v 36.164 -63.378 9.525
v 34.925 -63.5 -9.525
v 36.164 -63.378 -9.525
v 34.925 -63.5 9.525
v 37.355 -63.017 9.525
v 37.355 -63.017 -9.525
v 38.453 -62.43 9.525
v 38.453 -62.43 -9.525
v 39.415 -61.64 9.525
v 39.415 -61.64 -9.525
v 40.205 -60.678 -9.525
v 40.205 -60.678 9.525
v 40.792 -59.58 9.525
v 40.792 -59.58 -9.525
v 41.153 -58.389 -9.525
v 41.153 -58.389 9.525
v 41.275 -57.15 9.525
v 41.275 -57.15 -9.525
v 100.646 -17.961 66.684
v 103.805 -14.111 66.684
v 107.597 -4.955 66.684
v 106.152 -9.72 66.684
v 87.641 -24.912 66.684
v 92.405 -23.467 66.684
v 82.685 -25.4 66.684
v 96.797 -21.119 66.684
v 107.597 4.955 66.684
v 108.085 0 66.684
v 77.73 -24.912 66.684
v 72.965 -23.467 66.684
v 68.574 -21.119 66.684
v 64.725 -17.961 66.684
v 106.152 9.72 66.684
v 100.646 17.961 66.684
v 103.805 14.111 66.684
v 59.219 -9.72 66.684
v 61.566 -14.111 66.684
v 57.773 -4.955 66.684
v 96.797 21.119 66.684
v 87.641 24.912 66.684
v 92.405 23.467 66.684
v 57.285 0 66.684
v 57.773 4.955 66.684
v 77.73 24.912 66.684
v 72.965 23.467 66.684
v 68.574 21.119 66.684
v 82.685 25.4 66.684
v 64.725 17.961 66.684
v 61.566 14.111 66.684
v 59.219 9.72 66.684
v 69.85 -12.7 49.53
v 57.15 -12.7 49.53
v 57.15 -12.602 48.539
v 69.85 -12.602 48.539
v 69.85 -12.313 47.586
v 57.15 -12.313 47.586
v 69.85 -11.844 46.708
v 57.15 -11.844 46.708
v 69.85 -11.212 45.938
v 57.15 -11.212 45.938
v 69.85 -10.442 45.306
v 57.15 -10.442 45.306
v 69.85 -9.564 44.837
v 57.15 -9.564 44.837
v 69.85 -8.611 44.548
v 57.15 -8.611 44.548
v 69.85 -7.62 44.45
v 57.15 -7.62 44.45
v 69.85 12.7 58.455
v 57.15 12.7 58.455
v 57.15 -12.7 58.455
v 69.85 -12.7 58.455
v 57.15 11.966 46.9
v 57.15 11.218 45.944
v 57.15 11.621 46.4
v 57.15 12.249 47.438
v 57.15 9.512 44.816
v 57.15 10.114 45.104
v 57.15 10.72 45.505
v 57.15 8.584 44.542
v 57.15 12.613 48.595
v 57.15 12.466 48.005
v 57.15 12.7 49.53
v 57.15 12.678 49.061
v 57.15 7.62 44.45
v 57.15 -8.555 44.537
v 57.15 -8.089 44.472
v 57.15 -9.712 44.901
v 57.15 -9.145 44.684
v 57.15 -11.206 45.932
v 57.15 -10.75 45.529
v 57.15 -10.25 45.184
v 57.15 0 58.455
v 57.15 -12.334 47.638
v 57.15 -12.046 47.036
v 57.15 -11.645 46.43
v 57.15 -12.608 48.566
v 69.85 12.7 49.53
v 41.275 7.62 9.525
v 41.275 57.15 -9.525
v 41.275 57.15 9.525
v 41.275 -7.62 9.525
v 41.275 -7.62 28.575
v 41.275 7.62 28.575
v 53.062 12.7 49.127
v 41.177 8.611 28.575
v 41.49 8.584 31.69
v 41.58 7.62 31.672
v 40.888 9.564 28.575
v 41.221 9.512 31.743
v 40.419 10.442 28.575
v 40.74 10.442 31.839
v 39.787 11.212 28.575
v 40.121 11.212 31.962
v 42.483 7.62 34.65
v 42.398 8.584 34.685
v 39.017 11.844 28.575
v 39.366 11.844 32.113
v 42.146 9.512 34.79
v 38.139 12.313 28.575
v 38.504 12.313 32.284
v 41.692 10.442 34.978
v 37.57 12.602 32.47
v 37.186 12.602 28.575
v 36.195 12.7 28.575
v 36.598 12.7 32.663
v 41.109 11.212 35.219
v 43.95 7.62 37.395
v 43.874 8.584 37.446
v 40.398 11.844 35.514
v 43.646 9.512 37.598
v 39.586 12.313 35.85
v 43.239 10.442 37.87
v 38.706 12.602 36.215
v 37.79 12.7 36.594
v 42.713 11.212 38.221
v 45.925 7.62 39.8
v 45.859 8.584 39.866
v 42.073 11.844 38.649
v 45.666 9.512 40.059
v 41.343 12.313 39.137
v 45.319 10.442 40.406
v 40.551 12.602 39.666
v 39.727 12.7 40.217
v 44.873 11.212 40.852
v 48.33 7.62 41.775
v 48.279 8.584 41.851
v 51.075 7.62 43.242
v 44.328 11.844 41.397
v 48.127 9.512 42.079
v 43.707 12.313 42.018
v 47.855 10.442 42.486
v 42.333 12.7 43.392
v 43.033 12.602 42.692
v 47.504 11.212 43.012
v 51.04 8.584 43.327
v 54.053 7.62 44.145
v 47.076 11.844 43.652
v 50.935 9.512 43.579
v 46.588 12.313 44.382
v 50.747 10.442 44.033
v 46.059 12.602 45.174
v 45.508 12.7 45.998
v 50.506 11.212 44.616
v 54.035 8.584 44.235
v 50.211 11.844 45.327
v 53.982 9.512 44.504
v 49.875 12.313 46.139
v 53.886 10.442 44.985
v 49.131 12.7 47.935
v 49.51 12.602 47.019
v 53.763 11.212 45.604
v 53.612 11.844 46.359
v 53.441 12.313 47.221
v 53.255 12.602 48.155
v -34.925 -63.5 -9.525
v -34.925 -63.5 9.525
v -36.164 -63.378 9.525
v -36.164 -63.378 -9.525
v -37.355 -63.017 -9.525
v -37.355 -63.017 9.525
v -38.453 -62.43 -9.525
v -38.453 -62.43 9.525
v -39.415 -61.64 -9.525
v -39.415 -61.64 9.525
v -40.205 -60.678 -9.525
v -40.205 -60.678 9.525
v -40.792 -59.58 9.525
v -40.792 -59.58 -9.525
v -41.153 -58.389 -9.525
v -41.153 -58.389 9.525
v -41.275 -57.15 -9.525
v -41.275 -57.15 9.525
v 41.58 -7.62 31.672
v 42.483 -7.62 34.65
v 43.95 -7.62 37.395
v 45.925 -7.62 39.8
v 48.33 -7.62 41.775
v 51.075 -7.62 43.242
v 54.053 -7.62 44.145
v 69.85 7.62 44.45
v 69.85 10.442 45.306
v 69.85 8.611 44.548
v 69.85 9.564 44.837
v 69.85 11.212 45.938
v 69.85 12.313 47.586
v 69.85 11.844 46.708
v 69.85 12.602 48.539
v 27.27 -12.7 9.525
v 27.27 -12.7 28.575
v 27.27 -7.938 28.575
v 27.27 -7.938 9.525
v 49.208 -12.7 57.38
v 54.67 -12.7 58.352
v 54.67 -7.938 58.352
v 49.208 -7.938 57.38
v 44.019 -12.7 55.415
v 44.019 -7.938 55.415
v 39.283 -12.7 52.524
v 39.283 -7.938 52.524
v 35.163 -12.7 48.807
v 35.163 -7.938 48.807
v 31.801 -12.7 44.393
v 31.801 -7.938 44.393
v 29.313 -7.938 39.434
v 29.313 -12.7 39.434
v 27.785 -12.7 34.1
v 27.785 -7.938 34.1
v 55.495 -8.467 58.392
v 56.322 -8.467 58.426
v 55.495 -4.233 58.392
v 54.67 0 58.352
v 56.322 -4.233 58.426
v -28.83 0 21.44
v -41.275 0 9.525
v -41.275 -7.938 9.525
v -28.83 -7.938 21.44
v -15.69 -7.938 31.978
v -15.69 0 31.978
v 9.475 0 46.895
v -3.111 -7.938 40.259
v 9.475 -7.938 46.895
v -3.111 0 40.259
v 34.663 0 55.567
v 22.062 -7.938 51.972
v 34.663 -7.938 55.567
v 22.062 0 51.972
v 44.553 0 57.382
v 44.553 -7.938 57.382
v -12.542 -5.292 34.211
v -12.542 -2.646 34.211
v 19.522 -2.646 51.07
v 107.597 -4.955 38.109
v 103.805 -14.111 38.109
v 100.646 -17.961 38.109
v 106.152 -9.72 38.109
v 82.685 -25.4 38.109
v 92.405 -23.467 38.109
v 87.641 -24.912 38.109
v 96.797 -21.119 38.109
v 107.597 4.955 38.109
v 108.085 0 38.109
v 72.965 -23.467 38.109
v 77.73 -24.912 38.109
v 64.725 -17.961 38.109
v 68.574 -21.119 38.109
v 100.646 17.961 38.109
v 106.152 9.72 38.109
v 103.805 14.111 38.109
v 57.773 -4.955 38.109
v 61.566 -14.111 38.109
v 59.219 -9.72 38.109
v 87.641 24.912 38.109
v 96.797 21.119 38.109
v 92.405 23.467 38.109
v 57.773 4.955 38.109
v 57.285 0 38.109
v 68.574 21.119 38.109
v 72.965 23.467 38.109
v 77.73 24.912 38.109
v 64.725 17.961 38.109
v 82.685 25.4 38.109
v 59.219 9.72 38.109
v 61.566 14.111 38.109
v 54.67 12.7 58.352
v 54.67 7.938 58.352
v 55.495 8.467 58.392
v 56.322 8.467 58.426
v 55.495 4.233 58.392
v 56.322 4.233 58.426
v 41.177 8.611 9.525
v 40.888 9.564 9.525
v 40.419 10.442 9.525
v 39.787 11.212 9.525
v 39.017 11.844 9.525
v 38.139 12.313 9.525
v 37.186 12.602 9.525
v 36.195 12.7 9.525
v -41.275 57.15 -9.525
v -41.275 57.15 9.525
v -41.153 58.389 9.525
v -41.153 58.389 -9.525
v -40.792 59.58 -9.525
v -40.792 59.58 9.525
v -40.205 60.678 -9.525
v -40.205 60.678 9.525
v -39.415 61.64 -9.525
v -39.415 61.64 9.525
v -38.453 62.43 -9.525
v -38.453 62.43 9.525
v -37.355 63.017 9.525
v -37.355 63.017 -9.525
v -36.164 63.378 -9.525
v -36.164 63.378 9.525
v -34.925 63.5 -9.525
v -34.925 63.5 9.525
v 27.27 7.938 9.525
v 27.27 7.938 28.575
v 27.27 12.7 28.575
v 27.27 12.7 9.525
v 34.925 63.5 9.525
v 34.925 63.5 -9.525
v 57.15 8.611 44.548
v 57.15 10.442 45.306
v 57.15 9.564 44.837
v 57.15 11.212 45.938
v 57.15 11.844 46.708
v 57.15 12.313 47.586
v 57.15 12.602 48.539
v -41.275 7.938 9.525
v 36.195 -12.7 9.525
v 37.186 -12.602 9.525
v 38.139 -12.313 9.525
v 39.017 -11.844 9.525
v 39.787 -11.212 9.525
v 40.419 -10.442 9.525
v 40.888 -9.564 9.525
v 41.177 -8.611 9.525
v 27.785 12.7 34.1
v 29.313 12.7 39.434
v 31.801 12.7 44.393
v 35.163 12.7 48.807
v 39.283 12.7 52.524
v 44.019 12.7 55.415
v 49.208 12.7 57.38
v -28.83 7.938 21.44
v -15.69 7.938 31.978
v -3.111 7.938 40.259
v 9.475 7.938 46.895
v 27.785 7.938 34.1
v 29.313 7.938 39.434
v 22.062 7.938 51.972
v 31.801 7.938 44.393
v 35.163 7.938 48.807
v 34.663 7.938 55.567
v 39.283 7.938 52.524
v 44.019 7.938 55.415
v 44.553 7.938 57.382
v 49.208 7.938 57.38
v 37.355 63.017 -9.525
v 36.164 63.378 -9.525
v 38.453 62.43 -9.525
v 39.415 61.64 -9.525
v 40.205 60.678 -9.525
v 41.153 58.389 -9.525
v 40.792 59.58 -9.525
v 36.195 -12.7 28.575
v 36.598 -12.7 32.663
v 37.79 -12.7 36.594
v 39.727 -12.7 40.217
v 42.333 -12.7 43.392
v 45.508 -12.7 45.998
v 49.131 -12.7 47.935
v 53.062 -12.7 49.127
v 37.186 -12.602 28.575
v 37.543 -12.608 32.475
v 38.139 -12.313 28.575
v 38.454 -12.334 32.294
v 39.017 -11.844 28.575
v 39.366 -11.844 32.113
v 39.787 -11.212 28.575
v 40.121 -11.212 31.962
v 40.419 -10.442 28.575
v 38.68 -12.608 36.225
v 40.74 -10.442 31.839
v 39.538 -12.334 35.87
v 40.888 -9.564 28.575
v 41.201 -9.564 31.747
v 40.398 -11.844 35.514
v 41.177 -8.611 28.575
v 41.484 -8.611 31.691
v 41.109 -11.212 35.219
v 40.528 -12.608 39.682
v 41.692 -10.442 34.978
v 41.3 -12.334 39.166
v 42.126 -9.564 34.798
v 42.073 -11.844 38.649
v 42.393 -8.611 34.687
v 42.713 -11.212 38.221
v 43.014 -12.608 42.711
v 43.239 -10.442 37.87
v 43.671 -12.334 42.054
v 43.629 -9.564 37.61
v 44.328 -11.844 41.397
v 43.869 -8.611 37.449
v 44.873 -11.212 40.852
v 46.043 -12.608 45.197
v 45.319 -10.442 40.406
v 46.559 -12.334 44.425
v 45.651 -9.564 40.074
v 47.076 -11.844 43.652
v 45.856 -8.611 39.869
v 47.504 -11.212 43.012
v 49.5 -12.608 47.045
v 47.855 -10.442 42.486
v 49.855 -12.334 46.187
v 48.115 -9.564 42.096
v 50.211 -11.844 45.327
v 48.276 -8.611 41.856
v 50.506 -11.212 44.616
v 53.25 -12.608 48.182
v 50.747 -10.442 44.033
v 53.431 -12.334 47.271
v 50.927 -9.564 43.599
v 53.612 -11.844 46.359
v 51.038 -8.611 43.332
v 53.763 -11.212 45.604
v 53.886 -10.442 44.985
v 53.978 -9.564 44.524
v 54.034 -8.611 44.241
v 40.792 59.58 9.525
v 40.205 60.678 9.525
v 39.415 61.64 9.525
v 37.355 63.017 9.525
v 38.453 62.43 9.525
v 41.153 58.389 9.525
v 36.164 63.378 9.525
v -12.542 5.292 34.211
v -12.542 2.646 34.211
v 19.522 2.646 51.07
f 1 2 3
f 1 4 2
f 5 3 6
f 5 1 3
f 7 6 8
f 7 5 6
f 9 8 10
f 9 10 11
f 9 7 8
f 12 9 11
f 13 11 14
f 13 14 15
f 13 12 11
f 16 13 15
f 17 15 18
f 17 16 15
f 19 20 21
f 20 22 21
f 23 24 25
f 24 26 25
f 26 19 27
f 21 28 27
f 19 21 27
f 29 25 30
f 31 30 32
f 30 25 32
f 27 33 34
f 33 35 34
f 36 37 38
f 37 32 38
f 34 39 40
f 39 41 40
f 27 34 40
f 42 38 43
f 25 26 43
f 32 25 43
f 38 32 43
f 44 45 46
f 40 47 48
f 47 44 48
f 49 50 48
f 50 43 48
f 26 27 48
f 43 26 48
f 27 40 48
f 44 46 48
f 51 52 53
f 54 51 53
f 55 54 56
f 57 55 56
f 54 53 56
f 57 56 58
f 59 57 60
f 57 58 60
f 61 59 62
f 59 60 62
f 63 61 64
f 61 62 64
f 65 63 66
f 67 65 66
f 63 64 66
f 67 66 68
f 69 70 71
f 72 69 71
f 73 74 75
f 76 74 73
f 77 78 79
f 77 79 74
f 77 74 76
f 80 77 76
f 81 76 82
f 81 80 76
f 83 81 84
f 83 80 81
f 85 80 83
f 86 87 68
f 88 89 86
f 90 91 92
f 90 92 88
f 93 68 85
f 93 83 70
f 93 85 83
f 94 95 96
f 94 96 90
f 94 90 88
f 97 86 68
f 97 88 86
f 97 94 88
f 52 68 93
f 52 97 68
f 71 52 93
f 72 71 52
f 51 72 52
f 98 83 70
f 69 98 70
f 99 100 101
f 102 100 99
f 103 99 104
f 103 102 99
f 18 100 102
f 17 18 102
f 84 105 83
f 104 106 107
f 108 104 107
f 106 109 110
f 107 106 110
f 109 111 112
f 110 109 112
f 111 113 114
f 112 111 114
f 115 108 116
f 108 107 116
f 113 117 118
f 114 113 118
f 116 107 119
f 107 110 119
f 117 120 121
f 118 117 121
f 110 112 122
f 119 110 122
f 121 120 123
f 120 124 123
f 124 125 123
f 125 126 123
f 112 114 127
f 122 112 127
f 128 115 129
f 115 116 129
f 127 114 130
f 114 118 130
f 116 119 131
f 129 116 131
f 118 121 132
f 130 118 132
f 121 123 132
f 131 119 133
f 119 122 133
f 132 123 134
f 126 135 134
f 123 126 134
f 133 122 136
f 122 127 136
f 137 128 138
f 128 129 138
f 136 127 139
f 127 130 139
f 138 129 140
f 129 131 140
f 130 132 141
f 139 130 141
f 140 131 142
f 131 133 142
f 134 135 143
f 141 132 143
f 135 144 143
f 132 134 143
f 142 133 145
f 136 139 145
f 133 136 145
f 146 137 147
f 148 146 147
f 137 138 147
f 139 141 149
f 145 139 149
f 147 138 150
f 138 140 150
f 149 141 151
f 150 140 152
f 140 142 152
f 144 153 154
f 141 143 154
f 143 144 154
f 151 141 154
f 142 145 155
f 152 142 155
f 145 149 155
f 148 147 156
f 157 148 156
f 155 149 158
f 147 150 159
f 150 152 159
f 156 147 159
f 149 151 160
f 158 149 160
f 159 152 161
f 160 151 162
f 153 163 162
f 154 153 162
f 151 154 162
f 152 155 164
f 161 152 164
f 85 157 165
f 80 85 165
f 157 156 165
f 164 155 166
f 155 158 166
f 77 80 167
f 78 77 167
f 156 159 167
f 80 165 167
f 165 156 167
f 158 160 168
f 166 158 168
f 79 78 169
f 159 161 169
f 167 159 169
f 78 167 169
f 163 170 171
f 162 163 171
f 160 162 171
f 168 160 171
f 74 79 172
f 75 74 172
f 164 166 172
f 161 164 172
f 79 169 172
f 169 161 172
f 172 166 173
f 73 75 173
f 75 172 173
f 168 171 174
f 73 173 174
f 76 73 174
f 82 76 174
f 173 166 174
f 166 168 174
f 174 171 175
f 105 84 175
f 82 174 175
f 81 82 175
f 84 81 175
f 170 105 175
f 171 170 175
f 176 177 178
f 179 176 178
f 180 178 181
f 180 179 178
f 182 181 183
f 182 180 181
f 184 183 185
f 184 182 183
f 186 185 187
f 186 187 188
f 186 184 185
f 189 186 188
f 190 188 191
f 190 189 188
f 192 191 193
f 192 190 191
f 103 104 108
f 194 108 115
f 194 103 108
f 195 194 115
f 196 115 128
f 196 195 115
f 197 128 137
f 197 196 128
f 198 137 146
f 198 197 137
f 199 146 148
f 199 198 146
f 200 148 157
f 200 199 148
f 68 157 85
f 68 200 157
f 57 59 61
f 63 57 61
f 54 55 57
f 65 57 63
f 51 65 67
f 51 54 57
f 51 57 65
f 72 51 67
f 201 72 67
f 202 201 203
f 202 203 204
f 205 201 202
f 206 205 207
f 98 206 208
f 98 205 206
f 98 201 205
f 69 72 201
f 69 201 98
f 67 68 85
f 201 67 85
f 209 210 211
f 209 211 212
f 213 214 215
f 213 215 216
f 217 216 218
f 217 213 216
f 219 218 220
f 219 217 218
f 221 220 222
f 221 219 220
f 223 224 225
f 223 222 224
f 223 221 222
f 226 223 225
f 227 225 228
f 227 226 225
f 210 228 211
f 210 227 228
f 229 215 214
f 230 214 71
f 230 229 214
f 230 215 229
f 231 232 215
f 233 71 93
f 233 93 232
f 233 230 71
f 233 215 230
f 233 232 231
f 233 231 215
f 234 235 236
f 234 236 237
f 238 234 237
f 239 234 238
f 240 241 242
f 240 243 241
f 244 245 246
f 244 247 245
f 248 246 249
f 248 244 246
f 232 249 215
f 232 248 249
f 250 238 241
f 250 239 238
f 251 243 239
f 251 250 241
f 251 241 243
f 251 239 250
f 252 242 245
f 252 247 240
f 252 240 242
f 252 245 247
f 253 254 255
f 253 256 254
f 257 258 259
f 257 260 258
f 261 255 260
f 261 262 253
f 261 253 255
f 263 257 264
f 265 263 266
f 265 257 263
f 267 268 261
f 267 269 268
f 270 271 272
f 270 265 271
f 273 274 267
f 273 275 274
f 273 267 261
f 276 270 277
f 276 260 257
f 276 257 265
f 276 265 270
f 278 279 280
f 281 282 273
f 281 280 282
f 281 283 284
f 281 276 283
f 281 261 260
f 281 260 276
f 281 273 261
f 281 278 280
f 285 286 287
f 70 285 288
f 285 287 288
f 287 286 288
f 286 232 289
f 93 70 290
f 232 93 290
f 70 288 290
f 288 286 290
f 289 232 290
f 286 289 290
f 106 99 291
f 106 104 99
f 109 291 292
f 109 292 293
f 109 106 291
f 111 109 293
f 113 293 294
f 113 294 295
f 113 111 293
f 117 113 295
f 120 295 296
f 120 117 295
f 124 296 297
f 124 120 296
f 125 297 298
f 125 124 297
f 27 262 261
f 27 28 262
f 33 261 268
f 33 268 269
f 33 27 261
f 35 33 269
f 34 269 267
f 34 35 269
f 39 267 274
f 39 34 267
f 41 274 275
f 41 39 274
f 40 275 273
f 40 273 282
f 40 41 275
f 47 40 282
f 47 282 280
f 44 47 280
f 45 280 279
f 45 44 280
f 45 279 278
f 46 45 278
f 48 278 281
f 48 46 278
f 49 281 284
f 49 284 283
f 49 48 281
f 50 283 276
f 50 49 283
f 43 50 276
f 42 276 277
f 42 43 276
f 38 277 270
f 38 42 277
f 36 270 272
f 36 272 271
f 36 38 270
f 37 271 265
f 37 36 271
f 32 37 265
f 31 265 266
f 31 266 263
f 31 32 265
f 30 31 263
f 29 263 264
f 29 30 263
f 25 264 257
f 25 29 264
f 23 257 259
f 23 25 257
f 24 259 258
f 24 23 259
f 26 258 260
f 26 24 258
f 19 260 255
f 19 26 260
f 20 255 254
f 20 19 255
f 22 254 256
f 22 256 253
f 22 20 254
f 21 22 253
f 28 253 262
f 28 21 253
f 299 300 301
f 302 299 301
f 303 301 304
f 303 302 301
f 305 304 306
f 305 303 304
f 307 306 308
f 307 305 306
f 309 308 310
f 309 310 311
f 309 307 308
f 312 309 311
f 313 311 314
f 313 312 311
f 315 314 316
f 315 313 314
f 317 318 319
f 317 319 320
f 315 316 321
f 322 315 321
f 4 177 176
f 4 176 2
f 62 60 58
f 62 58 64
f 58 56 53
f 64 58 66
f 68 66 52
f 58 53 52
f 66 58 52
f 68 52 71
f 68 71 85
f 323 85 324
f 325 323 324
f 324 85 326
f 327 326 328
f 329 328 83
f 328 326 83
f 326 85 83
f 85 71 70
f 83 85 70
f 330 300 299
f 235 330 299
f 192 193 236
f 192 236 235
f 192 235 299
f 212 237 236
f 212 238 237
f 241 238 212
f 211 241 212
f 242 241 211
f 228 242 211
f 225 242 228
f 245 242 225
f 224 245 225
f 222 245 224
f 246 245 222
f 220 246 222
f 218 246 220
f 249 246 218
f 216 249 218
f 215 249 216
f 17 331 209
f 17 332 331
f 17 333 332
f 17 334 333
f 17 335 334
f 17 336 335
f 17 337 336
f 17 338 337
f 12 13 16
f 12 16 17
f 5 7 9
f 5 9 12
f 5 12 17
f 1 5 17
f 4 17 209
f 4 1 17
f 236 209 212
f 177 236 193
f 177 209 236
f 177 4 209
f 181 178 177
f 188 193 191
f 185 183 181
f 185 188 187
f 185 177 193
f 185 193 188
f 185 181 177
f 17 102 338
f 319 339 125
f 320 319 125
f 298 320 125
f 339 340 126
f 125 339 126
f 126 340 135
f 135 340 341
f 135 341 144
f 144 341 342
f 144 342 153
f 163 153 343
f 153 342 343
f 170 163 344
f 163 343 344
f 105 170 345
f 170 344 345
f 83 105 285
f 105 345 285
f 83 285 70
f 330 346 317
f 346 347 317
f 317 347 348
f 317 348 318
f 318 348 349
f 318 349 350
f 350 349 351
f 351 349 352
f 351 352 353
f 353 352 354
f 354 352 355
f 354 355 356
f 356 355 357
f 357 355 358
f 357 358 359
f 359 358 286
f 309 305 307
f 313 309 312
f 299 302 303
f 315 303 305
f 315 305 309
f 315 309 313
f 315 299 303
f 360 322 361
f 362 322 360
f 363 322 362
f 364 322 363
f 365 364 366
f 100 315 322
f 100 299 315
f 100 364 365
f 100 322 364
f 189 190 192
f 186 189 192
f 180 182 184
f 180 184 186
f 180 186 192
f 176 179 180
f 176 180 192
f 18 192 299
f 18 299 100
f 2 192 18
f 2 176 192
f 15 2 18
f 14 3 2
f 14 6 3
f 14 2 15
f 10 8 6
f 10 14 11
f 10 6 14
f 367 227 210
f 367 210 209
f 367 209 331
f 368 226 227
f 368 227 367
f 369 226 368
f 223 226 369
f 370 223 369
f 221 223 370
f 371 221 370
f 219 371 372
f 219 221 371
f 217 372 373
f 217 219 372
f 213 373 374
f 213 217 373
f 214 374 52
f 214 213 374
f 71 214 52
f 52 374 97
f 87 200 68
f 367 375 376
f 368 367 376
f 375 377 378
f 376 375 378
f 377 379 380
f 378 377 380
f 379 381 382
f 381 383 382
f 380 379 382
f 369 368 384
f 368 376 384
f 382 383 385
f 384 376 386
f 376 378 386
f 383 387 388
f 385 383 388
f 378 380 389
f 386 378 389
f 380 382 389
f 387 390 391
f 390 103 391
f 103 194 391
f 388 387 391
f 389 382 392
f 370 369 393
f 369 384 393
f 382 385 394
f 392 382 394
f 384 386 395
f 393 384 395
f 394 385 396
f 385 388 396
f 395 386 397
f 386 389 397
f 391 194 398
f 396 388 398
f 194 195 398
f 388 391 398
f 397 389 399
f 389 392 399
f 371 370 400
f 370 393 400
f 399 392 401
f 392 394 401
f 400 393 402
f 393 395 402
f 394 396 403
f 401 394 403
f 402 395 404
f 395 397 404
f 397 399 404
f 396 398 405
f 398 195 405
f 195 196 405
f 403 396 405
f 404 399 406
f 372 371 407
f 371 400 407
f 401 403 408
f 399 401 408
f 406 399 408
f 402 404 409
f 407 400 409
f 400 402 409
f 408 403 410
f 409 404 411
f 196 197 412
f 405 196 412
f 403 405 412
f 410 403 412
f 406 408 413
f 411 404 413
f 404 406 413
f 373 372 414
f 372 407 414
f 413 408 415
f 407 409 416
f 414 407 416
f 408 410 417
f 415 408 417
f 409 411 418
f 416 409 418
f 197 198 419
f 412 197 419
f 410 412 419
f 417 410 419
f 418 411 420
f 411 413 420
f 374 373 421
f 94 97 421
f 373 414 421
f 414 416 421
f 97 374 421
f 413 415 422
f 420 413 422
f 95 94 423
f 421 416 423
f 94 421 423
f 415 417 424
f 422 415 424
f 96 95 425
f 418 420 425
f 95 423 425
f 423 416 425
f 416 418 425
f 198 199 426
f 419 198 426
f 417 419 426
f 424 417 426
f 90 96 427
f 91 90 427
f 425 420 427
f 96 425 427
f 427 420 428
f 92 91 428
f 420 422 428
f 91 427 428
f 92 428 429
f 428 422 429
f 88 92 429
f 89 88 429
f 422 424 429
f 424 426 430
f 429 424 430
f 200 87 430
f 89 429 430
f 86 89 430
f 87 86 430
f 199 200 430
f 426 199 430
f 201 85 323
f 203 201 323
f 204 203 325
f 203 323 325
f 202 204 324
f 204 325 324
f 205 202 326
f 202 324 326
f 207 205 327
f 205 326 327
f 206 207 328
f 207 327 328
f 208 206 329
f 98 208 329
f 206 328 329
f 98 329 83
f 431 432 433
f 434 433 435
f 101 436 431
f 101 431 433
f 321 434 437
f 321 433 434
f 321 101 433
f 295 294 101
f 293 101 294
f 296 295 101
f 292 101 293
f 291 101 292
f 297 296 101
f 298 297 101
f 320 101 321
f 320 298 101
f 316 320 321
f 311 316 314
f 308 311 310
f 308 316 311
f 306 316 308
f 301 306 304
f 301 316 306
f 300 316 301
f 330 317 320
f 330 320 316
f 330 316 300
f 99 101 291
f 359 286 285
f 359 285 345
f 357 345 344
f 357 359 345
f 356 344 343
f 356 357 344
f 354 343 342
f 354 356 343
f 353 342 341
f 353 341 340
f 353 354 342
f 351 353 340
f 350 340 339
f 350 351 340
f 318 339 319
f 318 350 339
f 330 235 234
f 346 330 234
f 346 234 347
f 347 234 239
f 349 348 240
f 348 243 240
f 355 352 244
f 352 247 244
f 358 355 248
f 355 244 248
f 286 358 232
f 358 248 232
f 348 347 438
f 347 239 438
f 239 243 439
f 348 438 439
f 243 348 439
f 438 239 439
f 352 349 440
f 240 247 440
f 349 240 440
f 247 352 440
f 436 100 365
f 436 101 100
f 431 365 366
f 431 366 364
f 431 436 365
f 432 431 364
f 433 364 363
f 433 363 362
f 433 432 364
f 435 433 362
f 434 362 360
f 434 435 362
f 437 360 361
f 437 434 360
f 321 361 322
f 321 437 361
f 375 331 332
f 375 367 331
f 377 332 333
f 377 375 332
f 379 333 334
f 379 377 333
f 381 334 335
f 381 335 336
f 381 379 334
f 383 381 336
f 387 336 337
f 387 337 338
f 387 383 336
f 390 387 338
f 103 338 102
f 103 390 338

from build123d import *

# Parameters (mm, degrees)
F1_DEPTH  = 63.5
F2_DEPTH  = 12.7
F3_DEPTH  = 7.9375
F5_R      = 6.35
F6_W      = 25.4
F6_H      = 28.575
F8_R      = 6.35
F9_R      = 6.35
F10_R     = 5.08
F11_DEPTH = 12.7


with BuildPart() as f1:
    # F0 (on Front) → F1 (new body, symmetric)
    with BuildSketch(Plane.XZ):
        Polygon((41.275, -9.525), (41.275, 9.525), (27.270238, 9.525), (-41.275, 9.525), (-41.275, -9.525), align=None)
    extrude(amount=F1_DEPTH, both=True)

    # F0 (on Front) → F2 (join, symmetric)
    with BuildSketch(Plane.XZ):
        with BuildLine():
            Line((27.270238, 9.525), (41.275, 9.525))
            Line((41.275, 9.525), (41.275, 28.575))
            ThreePointArc((41.275, 28.575), (45.92468, 39.80032), (57.15, 44.45))
            Line((57.15, 44.45), (57.15, 58.454762))
            add(Edge.make_bspline(
                [(54.670299, 58.35169), (55.494711, 58.394695), (56.321283, 58.429082), (57.15, 58.454762)],
                knots=[107.495526, 107.495526, 107.495526, 107.495526, 109.916342, 109.916342, 109.916342, 109.916342], degree=3))
            ThreePointArc((54.670299, 58.35169), (35.162583, 48.80749), (27.270238, 28.575))
            Line((27.270238, 28.575), (27.270238, 9.525))
        make_face()
    extrude(amount=F2_DEPTH, both=True)

    # F0 (on Front) → F3 (join, symmetric)
    with BuildSketch(Plane.XZ):
        with BuildLine():
            Line((-41.275, 9.525), (27.270238, 9.525))
            Line((27.270238, 9.525), (27.270238, 28.575))
            ThreePointArc((27.270238, 28.575), (35.162583, 48.80749), (54.670299, 58.35169))
            add(Edge.make_bspline(
                [(-41.275, 9.525), (-14.289114, 37.540552), (18.062517, 56.442069), (54.670299, 58.35169)],
                knots=[0, 0, 0, 0, 107.495526, 107.495526, 107.495526, 107.495526], degree=3))
        make_face()
    extrude(amount=F3_DEPTH, both=True)

    # F5
    f5_edges = [f1.edges().sort_by_distance(p)[0] for p in [
        (41.275, -63.5, 0),
    ]]
    fillet(f5_edges, radius=F5_R)

    # F8
    f8_edges = [f1.edges().sort_by_distance(p)[0] for p in [
        (-41.275, -63.5, 0),
    ]]
    fillet(f8_edges, radius=F8_R)

    # F9
    f9_edges = [f1.edges().sort_by_distance(p)[0] for p in [
        (41.275, 63.5, 0),
        (-41.275, 63.5, 0),
    ]]
    fillet(f9_edges, radius=F9_R)

    # F10
    f10_edges = [f1.edges().sort_by_distance(p)[0] for p in [
        (45.92468, -12.7, 39.80032),
        (41.275, 12.7, 19.05),
    ]]
    fillet(f10_edges, radius=F10_R)


with BuildPart() as f7:
    # F6 (on Front) → F7 (revolve)
    with BuildSketch(Plane.XZ):
        with Locations((95.385324, 52.396486)):
            Rectangle(F6_W, F6_H)
    revolve(axis=Axis((82.685324, 0, 52.396486), (0, 0, 1)))


with BuildPart() as f11:
    # F2_face (on face) → F11 (new body)
    with BuildSketch(Plane(origin=(57.15, 0, 51.640956), x_dir=(0, 1, 0), z_dir=(1, 0, 0))):
        with BuildLine():
            Line((-7.62, -7.190956), (7.62, -7.190956))
            ThreePointArc((7.62, -7.190956), (11.212102, -5.703059), (12.7, -2.110956))
            Line((12.7, -2.110956), (12.7, 6.813806))
            Line((12.7, 6.813806), (0, 6.813806))
            Line((0, 6.813806), (-12.7, 6.813806))
            Line((-12.7, 6.813806), (-12.7, -2.110956))
            ThreePointArc((-12.7, -2.110956), (-11.212102, -5.703059), (-7.62, -7.190956))
        make_face()
    extrude(amount=F11_DEPTH)


solid = Compound([f1.part, f7.part, f11.part])
